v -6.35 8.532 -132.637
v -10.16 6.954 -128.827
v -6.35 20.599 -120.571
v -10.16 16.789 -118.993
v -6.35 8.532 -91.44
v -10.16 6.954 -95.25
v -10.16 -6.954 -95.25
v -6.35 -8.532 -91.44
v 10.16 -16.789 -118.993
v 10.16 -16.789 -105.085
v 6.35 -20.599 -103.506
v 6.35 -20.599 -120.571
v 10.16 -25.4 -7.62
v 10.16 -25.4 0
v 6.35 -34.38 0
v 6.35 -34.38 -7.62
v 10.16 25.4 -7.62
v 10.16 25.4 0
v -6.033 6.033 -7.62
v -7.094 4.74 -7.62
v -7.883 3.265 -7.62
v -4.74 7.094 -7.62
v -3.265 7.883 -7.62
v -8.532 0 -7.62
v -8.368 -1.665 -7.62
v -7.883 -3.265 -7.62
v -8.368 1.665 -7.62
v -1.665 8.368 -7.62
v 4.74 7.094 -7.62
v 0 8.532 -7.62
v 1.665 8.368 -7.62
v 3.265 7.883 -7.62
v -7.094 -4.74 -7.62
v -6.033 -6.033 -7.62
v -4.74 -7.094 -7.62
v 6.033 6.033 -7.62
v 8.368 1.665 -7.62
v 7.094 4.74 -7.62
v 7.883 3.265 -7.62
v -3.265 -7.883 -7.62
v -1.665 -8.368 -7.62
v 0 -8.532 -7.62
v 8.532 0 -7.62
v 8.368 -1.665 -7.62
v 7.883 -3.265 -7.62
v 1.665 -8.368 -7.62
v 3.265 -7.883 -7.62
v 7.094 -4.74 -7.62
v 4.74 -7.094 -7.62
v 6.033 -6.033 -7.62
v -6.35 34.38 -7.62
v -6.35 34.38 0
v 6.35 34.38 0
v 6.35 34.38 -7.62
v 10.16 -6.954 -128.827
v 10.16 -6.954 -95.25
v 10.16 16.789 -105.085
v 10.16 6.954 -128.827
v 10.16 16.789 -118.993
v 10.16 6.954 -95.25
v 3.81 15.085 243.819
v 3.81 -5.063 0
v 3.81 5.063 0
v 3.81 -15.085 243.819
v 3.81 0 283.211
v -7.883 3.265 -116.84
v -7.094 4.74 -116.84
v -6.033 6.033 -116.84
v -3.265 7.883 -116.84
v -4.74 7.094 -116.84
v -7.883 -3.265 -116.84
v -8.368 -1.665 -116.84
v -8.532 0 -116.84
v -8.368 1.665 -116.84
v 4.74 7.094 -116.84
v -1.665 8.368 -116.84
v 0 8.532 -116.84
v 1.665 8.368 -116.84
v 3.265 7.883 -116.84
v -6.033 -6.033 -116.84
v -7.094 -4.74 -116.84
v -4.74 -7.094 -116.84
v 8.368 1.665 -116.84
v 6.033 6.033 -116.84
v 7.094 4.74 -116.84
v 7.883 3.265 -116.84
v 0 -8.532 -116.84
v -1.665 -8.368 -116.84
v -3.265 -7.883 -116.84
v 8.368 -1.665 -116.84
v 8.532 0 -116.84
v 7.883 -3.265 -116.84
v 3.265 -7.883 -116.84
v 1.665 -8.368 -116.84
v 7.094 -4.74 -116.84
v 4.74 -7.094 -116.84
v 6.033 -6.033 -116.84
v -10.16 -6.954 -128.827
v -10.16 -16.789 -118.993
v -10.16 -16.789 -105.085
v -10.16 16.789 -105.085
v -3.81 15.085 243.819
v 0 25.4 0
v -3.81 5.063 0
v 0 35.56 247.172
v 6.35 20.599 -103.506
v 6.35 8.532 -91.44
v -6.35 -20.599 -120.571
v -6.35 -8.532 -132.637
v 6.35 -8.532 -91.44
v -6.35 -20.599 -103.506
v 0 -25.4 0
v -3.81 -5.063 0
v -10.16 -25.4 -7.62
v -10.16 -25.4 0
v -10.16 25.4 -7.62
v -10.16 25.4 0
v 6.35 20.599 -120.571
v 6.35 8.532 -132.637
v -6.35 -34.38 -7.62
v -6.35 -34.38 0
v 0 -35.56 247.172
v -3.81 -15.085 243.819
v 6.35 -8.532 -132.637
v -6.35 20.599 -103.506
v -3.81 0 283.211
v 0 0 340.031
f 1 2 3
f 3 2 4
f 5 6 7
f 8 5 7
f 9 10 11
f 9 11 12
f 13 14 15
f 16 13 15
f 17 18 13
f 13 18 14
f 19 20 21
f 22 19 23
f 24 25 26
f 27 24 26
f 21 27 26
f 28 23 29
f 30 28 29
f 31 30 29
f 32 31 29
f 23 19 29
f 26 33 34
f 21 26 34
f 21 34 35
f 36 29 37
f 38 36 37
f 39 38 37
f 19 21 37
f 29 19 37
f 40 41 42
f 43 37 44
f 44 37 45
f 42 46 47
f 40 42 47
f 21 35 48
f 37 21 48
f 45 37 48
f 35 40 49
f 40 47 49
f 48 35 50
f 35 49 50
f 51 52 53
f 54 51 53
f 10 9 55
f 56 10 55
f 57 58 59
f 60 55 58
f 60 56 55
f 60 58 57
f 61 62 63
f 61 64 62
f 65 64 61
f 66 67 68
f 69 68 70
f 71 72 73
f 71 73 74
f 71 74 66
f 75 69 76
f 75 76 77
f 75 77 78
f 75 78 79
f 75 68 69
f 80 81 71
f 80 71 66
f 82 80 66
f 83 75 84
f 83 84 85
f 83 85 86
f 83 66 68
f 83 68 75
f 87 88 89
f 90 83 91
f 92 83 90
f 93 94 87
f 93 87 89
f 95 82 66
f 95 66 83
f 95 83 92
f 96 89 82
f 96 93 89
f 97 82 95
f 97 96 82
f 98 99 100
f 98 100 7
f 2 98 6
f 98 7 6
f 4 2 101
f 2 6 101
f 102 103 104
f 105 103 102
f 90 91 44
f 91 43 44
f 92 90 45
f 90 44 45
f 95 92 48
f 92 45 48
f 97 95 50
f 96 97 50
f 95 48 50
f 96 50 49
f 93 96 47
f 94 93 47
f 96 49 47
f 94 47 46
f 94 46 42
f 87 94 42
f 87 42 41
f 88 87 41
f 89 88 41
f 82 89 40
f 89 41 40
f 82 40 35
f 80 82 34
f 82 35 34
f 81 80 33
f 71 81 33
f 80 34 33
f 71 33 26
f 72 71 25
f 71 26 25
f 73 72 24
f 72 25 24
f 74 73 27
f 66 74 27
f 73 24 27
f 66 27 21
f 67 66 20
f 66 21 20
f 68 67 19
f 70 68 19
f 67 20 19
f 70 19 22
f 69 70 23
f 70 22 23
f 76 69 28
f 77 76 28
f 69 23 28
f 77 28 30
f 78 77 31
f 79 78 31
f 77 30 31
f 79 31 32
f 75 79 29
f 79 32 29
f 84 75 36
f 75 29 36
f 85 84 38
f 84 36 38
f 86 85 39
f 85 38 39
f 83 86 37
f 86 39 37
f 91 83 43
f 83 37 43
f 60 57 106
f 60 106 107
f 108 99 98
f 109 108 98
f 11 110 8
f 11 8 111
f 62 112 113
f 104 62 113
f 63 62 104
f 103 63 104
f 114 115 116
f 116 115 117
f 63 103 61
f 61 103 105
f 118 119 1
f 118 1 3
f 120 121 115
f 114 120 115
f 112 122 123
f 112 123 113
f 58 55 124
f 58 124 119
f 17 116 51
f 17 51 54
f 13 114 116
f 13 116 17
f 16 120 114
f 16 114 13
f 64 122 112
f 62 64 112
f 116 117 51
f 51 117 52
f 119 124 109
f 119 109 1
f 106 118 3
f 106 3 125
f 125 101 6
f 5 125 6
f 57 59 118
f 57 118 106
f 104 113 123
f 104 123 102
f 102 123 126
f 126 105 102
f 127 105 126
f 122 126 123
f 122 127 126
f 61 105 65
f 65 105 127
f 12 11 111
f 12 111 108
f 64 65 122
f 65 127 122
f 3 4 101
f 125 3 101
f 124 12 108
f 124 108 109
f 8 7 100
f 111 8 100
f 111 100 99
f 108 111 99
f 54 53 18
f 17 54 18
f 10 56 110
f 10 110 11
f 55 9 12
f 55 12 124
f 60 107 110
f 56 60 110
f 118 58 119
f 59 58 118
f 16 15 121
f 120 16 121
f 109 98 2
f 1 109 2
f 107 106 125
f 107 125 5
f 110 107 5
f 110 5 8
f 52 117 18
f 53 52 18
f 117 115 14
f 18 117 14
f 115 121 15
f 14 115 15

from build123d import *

# Parameters (mm, degrees)
F1_DEPTH  = 3.81
F2_SIZE2  = 3.81
F2_SIZE   = 20.32
F3_SIZE2  = 3.80999
F3_SIZE   = 20.31999
F5_DEPTH  = 7.62
F6_R      = 8.5322450092
F7_DEPTH  = 83.82
F9_R      = 8.5322450092
F10_DEPTH = 25.4
F11_DEPTH = 10.16
F12_SIZE  = 3.81


# Not quite as in the source:
# - a fillet or chamfer is up to 0.001 mm smaller than in the source, because OpenCascade refuses the exact size
# - ends of sketch curves that miss each other by under 0.0002 mm in the source are joined


with BuildPart() as f1:
    # F0 (on Right) → F1 (new body, symmetric)
    with BuildSketch(Plane.YZ):
        Polygon((-25.4, 0), (0, 0), (0, 82.3990235604), (0, 247.1720576286), (-35.56, 247.1720576286), align=None)
        Polygon((0, 82.3990235604), (0, 0), (25.4, 0), (35.56, 247.1720576286), (0, 247.1720576286), align=None)
        Polygon((0, 340.030759573), (0, 247.1720576286), (35.56, 247.1720576286), align=None)
        Polygon((-35.56, 247.1720576286), (0, 247.1720576286), (0, 340.030759573), align=None)
    extrude(amount=F1_DEPTH, both=True)

    # F2
    f2_edges = [f1.edges().sort_by_distance(p)[0] for p in [
        (3.81, -30.48, 123.586029),
        (3.81, -17.78, 293.601409),
        (3.81, 17.78, 293.601409),
        (3.81, 30.48, 123.586029),
    ]]
    f2_side = f1.faces().sort_by_distance((3.81, 0, 156.997019))[0]
    chamfer(f2_edges, length=F2_SIZE, length2=F2_SIZE2, reference=f2_side)

    # F3 (size 20.32 and 3.81 in the source; OpenCascade refuses exactly that, so slightly less here)
    f3_edges = [f1.edges().sort_by_distance(p)[0] for p in [
        (-3.81, -30.48, 123.586029),
        (-3.81, -17.78, 293.601409),
        (-3.81, 30.48, 123.586029),
        (-3.81, 17.78, 293.601409),
    ]]
    f3_side = f1.faces().sort_by_distance((-3.81, 0, 156.997019))[0]
    chamfer(f3_edges, length=F3_SIZE, length2=F3_SIZE2, reference=f3_side)


with BuildPart() as f5:
    # F4 (on face) → F5 (new body)
    with BuildSketch(Plane(origin=(0, 0, 0), x_dir=(1, 0, 0), z_dir=(0, 0, -1))):
        Polygon((6.35, 34.3802462), (-6.35, 34.3802462), (-10.16, 25.3999900789), (-10.16, -9.9211e-06), (0, 0), (10.16, -9.9211e-06), (10.16, 25.3999900789), align=None)
        Polygon((0, 0), (-10.16, -9.9211e-06), (-10.16, -25.4000099211), (-6.35, -34.3802660421), (6.35, -34.3802660421), (10.16, -25.4000099211), (10.16, -9.9211e-06), align=None)
    extrude(amount=F5_DEPTH)


with BuildPart() as f7:
    # F6 (on face) → F7 (new body)
    with BuildSketch(Plane(origin=(0, 0, -7.62), x_dir=(1, 0, 0), z_dir=(0, 0, -1))):
        Circle(F6_R)
    extrude(amount=F7_DEPTH)

    # F9 (on face) → F10 (join)
    with BuildSketch(Plane(origin=(0, 0, -91.44), x_dir=(1, 0, 0), z_dir=(0, 0, -1))):
        Circle(F9_R)
    extrude(amount=F10_DEPTH)


with BuildPart() as f11:
    # F8 (on Right) → F11 (new body, symmetric)
    with BuildSketch(Plane.YZ):
        Polygon((20.5986616187, -103.5064166095), (8.5322450092, -91.44), (0, -91.44), (-8.5322450092, -91.44), (-20.5986616187, -103.5064166095), (-20.5986616187, -120.5709066278), (-8.5322450092, -132.6373232373), (8.5322450092, -132.6373232373), (20.5986616187, -120.5709066278), align=None)
    extrude(amount=F11_DEPTH, both=True)

    # F12
    f12_edges = [f11.edges().sort_by_distance(p)[0] for p in [
        (10.16, 20.598662, -112.038662),
        (10.16, 14.565453, -97.473208),
        (10.16, 0, -91.44),
        (10.16, 14.565453, -126.604115),
        (10.16, 0, -132.637323),
        (10.16, -14.565453, -126.604115),
        (10.16, -14.565453, -97.473208),
        (10.16, -20.598662, -112.038662),
        (-10.16, -20.598662, -112.038662),
        (-10.16, -14.565453, -97.473208),
        (-10.16, -14.565453, -126.604115),
        (-10.16, 0, -132.637323),
        (-10.16, 0, -91.44),
        (-10.16, 14.565453, -97.473208),
        (-10.16, 20.598662, -112.038662),
        (-10.16, 14.565453, -126.604115),
    ]]
    chamfer(f12_edges, length=F12_SIZE)


solid = Compound([f1.part, f5.part, f7.part, f11.part])
